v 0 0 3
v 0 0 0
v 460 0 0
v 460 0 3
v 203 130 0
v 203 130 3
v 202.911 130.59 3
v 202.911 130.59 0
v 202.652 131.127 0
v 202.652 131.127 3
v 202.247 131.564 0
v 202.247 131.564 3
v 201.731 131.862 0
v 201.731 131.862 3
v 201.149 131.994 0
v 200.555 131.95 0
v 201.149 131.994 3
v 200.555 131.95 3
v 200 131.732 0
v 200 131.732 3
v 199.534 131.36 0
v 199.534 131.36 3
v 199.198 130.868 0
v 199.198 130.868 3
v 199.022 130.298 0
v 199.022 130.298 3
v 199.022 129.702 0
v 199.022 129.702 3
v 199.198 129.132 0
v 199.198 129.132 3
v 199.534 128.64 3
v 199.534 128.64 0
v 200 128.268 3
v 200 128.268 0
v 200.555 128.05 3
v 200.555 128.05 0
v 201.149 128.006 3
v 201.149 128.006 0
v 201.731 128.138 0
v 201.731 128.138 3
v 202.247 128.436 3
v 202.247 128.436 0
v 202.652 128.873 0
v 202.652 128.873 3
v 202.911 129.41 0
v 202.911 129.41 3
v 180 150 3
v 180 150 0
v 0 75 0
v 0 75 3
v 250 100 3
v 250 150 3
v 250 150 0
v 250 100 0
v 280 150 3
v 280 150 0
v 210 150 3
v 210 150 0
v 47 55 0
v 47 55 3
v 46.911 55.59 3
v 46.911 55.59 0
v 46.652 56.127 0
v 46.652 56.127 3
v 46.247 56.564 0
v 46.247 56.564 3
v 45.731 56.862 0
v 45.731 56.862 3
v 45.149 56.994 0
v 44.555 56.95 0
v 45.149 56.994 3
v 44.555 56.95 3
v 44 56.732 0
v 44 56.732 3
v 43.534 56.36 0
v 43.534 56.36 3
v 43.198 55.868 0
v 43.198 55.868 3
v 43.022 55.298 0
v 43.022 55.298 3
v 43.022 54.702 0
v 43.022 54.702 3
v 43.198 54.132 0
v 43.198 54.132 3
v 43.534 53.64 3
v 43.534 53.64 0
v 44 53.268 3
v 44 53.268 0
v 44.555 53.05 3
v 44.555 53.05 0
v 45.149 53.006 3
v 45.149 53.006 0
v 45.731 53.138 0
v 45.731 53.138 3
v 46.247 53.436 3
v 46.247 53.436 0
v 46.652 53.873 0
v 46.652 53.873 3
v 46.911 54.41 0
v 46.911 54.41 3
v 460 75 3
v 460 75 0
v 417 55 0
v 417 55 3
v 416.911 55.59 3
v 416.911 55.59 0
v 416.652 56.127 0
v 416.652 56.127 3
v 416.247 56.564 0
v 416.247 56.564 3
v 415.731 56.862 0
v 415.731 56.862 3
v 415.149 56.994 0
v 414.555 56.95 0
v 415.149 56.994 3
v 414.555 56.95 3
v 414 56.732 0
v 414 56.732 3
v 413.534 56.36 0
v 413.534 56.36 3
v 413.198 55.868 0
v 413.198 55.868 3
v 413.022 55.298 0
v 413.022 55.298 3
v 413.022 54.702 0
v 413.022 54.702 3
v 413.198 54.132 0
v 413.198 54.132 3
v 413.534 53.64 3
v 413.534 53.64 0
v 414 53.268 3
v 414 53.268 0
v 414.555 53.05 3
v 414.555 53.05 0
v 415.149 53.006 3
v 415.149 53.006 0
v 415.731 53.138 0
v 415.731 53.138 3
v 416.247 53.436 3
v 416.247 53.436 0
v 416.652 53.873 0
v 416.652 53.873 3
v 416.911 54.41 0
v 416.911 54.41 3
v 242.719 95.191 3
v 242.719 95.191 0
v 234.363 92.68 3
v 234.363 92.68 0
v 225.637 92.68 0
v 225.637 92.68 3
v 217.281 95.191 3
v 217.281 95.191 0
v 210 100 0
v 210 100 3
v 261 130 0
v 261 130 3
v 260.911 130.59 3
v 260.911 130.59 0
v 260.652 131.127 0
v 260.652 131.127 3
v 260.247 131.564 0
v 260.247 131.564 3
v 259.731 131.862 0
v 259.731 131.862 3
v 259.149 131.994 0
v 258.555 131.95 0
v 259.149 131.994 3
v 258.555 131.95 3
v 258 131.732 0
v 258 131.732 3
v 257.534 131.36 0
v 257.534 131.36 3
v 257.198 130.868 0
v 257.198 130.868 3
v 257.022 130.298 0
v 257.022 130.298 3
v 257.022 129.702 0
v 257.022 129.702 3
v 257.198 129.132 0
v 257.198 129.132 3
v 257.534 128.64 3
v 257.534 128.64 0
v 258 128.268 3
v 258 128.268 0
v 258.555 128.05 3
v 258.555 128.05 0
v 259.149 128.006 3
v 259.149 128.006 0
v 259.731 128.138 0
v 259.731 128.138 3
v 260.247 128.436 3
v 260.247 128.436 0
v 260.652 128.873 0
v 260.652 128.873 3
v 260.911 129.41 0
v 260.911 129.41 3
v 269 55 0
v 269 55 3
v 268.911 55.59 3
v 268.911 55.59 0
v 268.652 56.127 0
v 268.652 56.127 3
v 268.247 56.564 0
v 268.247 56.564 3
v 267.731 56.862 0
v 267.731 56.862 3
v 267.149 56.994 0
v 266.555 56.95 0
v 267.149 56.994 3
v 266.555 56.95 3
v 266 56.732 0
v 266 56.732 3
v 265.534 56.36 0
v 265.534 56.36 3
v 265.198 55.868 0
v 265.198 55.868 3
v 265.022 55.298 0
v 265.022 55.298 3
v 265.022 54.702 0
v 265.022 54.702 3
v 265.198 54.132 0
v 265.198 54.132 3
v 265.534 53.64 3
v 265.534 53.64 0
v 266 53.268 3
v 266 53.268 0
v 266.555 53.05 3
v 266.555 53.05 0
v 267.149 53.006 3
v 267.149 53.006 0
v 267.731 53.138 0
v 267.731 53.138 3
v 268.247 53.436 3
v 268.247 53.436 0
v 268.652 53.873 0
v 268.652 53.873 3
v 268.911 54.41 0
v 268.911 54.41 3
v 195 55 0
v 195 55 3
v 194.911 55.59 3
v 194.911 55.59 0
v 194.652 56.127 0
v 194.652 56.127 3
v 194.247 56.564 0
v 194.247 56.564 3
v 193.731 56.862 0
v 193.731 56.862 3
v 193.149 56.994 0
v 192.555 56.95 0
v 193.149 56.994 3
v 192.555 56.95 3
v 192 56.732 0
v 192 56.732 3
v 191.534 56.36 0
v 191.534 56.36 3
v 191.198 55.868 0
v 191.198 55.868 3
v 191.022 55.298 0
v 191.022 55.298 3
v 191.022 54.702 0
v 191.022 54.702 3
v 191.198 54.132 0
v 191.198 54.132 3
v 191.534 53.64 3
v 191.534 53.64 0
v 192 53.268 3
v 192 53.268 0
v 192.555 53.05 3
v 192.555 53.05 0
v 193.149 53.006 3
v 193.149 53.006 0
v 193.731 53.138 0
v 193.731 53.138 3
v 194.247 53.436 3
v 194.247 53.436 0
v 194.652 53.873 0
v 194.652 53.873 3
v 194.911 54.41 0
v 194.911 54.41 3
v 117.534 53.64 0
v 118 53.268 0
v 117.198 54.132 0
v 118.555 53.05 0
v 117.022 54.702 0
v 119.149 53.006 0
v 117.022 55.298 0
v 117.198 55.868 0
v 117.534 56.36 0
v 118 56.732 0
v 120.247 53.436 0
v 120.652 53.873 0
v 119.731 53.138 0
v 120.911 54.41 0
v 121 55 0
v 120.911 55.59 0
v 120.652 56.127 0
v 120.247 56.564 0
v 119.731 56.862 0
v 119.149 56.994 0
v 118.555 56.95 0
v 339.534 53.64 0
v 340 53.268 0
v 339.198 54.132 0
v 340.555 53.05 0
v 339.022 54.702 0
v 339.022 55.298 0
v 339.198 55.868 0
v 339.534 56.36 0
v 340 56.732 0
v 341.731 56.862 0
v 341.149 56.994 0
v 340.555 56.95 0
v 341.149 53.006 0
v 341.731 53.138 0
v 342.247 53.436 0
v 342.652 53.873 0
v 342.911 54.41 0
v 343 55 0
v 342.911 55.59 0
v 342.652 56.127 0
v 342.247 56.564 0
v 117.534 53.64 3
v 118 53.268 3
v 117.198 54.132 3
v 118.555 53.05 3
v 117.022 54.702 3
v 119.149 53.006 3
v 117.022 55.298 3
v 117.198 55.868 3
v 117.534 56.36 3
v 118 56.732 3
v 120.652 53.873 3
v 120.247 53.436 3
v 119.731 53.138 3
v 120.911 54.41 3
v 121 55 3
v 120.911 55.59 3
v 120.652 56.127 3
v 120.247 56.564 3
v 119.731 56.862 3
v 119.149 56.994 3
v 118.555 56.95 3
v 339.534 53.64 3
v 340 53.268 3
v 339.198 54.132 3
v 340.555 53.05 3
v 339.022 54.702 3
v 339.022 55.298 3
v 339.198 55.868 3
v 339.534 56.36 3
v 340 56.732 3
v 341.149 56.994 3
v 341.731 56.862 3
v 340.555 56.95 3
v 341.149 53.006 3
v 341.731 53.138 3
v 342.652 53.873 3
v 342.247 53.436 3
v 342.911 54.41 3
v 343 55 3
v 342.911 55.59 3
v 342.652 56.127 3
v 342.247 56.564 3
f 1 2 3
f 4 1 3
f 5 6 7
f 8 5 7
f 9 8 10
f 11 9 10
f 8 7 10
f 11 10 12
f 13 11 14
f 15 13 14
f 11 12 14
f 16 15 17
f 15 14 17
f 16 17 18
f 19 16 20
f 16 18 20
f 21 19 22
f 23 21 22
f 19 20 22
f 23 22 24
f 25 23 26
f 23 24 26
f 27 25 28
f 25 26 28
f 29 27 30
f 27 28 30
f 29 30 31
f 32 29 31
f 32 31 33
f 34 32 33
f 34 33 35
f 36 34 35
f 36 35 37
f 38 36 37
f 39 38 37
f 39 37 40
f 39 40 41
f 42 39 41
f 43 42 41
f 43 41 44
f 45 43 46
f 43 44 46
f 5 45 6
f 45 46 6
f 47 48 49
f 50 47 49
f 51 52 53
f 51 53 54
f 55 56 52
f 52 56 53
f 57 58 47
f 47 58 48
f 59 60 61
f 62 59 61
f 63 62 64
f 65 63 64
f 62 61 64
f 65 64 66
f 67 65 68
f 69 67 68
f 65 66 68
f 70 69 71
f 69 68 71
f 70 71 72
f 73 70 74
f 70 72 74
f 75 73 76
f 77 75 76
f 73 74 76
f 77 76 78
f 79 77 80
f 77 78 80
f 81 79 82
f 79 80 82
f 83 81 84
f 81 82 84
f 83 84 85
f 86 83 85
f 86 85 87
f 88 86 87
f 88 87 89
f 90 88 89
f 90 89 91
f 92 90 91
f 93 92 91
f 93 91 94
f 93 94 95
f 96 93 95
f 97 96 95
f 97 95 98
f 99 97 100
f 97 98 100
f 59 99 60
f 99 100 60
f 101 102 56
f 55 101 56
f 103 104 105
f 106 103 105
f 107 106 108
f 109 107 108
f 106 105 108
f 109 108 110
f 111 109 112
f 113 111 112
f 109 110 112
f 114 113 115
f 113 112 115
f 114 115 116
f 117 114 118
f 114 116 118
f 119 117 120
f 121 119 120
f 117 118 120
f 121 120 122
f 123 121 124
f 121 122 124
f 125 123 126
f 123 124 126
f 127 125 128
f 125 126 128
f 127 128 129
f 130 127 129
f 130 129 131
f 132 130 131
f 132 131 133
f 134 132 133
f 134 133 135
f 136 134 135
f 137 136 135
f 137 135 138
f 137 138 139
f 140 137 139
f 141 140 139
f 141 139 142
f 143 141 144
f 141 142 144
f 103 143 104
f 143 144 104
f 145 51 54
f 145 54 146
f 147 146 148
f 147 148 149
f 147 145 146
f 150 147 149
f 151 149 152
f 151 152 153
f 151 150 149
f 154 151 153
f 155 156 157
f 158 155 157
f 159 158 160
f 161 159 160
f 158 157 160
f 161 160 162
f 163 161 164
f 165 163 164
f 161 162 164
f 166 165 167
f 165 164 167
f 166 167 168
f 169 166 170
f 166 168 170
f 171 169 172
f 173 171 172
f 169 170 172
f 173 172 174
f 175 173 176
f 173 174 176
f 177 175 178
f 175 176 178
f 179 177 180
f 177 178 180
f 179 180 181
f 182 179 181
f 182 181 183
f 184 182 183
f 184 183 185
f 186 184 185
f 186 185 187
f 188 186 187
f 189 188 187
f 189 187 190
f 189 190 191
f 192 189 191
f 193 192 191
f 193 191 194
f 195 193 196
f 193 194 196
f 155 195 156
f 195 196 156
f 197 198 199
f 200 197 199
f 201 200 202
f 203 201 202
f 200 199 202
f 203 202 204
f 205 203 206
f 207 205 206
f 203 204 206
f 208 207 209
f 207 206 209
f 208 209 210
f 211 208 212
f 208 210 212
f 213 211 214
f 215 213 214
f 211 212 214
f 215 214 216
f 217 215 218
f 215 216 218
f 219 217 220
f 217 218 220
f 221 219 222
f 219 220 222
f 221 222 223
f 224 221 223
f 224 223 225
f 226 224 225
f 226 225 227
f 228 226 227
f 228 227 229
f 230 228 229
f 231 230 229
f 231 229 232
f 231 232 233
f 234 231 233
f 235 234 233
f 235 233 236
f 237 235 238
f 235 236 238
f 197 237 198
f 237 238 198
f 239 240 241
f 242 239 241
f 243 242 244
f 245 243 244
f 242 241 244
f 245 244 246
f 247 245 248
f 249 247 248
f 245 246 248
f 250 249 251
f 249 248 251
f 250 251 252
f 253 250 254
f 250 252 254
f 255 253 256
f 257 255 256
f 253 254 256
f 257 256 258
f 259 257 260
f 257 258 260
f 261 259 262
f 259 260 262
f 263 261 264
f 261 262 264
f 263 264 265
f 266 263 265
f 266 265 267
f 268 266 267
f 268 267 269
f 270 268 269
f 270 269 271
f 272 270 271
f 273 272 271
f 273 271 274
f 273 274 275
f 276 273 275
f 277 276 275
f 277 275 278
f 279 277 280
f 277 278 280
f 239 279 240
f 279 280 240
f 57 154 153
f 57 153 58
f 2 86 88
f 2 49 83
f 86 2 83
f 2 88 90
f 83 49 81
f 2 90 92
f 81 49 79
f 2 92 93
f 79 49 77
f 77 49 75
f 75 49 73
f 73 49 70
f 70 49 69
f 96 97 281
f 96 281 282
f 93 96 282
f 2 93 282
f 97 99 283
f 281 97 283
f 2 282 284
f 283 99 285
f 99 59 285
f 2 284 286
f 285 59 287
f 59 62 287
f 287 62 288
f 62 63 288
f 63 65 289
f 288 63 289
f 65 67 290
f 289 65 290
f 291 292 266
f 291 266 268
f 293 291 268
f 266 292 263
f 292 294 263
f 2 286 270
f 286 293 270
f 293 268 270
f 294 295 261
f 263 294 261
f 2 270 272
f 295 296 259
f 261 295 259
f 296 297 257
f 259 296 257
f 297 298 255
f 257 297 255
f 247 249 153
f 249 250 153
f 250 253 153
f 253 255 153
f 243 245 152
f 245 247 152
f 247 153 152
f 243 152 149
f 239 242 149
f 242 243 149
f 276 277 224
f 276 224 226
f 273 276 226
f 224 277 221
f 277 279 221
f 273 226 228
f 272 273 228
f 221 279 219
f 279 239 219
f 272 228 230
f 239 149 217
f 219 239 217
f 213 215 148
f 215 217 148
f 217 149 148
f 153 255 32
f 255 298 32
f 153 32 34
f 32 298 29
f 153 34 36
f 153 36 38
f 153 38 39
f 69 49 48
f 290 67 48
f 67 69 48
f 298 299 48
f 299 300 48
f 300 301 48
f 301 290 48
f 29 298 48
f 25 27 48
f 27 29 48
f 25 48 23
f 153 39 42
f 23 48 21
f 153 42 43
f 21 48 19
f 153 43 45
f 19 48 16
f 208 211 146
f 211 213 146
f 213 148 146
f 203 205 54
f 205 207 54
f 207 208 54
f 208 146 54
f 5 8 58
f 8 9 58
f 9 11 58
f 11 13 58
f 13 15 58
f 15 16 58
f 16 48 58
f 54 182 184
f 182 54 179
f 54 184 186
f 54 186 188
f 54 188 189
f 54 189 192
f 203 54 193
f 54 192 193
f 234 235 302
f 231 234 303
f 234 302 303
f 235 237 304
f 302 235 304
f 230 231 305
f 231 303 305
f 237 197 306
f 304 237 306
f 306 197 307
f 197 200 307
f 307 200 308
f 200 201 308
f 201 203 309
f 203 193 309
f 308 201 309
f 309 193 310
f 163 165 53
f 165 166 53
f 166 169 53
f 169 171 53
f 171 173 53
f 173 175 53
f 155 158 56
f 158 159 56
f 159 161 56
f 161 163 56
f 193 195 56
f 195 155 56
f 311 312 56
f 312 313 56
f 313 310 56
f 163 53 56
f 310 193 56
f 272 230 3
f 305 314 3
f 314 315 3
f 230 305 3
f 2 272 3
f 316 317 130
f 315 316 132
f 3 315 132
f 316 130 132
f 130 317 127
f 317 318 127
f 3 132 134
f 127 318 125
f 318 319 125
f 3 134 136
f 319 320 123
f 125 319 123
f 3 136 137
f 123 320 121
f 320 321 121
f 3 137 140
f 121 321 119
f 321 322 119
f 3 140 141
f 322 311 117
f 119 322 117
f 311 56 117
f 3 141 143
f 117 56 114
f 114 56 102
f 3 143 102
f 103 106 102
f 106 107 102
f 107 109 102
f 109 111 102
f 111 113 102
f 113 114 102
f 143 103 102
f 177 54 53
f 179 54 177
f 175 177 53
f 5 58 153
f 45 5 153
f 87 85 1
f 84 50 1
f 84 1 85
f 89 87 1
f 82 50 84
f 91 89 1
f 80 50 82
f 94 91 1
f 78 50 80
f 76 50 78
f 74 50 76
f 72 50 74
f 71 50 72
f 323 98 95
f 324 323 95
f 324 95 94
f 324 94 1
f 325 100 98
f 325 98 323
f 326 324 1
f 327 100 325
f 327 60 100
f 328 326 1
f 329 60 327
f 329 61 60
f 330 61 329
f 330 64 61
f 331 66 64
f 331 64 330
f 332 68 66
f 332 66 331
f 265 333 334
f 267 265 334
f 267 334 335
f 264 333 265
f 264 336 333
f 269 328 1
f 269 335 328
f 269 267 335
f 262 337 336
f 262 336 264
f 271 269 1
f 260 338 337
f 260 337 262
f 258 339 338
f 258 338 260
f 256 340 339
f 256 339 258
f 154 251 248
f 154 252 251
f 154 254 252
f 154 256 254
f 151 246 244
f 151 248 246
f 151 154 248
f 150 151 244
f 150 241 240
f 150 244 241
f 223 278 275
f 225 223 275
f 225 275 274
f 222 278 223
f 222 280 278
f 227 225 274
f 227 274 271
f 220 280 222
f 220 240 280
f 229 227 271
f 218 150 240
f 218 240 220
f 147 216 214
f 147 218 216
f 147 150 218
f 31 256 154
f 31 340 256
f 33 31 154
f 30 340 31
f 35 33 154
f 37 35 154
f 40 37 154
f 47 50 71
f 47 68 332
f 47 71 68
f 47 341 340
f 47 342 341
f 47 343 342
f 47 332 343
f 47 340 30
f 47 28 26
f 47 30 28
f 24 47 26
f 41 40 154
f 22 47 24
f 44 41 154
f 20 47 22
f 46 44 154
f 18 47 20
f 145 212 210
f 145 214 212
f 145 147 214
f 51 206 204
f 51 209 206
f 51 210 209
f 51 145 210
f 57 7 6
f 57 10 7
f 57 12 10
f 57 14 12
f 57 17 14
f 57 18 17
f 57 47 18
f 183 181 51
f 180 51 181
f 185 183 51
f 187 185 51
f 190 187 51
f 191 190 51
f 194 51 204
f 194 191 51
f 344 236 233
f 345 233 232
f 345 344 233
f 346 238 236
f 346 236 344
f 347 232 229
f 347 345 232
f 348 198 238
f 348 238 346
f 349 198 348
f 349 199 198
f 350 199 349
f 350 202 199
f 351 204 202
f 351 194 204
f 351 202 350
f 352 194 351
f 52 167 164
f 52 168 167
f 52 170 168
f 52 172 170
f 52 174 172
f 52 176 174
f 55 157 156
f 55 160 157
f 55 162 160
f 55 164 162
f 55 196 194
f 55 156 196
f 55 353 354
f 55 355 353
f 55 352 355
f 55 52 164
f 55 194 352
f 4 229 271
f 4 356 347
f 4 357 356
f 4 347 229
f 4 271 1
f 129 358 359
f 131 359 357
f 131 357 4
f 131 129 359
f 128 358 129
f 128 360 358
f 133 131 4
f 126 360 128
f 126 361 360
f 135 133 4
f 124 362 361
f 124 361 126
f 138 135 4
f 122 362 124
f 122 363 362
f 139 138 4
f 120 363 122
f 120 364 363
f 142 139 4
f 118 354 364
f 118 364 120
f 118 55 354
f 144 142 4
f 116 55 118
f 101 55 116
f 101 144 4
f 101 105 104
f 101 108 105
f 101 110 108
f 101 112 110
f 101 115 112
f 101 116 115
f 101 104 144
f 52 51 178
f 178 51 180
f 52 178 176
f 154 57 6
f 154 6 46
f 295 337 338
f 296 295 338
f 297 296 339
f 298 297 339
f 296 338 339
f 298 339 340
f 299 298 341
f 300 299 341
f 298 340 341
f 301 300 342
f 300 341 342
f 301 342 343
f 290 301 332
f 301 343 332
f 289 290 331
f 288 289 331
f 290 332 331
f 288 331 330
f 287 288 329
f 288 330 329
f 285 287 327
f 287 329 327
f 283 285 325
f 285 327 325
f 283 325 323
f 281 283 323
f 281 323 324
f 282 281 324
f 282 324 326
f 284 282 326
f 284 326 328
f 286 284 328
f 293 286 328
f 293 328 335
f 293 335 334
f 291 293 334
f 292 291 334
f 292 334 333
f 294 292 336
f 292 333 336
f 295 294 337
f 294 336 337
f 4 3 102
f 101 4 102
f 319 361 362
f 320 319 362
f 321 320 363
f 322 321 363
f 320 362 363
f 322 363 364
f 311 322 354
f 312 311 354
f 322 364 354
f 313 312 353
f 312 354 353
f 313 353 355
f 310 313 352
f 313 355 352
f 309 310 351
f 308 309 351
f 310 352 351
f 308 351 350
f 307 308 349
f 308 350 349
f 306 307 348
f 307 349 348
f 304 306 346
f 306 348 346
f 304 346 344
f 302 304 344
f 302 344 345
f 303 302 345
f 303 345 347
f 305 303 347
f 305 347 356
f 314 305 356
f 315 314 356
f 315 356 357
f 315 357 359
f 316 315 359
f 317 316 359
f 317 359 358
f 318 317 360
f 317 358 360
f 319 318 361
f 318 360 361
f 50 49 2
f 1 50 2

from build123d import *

# Parameters (mm, degrees)
Y_KSEKLIK_EKSTR_ZYON1_DEPTH = 3
IZIM2_R                     = 2
KES_EKSTR_ZYON1_DEPTH       = 3


with BuildPart() as part:
    # Çizim1 → Yükseklik-Ekstrüzyon1 (new body)
    with BuildSketch(Plane.XY):
        Polygon((0, 0), (460, 0), (460, 75), (280, 150), (180, 150), (0, 75), align=None)
    extrude(amount=Y_KSEKLIK_EKSTR_ZYON1_DEPTH)

    # Çizim2 → Kes-Ekstrüzyon1 (cut)
    with BuildSketch(Plane.XY.offset(3)):
        with Locations((45, 55)):
            Circle(IZIM2_R)
        with Locations((119, 55)):
            Circle(IZIM2_R)
        with Locations((193, 55)):
            Circle(IZIM2_R)
        with Locations((267, 55)):
            Circle(IZIM2_R)
        with Locations((341, 55)):
            Circle(IZIM2_R)
        with Locations((415, 55)):
            Circle(IZIM2_R)
        with Locations((201, 130)):
            Circle(IZIM2_R)
        with Locations((259, 130)):
            Circle(IZIM2_R)
        with BuildLine():
            Line((210, 150), (250, 150))
            Line((250, 150), (250, 100))
            ThreePointArc((250, 100), (230, 92.360679775), (210, 100))
            Line((210, 100), (210, 150))
        make_face()
    extrude(amount=-KES_EKSTR_ZYON1_DEPTH, mode=Mode.SUBTRACT)


solid = part.part
